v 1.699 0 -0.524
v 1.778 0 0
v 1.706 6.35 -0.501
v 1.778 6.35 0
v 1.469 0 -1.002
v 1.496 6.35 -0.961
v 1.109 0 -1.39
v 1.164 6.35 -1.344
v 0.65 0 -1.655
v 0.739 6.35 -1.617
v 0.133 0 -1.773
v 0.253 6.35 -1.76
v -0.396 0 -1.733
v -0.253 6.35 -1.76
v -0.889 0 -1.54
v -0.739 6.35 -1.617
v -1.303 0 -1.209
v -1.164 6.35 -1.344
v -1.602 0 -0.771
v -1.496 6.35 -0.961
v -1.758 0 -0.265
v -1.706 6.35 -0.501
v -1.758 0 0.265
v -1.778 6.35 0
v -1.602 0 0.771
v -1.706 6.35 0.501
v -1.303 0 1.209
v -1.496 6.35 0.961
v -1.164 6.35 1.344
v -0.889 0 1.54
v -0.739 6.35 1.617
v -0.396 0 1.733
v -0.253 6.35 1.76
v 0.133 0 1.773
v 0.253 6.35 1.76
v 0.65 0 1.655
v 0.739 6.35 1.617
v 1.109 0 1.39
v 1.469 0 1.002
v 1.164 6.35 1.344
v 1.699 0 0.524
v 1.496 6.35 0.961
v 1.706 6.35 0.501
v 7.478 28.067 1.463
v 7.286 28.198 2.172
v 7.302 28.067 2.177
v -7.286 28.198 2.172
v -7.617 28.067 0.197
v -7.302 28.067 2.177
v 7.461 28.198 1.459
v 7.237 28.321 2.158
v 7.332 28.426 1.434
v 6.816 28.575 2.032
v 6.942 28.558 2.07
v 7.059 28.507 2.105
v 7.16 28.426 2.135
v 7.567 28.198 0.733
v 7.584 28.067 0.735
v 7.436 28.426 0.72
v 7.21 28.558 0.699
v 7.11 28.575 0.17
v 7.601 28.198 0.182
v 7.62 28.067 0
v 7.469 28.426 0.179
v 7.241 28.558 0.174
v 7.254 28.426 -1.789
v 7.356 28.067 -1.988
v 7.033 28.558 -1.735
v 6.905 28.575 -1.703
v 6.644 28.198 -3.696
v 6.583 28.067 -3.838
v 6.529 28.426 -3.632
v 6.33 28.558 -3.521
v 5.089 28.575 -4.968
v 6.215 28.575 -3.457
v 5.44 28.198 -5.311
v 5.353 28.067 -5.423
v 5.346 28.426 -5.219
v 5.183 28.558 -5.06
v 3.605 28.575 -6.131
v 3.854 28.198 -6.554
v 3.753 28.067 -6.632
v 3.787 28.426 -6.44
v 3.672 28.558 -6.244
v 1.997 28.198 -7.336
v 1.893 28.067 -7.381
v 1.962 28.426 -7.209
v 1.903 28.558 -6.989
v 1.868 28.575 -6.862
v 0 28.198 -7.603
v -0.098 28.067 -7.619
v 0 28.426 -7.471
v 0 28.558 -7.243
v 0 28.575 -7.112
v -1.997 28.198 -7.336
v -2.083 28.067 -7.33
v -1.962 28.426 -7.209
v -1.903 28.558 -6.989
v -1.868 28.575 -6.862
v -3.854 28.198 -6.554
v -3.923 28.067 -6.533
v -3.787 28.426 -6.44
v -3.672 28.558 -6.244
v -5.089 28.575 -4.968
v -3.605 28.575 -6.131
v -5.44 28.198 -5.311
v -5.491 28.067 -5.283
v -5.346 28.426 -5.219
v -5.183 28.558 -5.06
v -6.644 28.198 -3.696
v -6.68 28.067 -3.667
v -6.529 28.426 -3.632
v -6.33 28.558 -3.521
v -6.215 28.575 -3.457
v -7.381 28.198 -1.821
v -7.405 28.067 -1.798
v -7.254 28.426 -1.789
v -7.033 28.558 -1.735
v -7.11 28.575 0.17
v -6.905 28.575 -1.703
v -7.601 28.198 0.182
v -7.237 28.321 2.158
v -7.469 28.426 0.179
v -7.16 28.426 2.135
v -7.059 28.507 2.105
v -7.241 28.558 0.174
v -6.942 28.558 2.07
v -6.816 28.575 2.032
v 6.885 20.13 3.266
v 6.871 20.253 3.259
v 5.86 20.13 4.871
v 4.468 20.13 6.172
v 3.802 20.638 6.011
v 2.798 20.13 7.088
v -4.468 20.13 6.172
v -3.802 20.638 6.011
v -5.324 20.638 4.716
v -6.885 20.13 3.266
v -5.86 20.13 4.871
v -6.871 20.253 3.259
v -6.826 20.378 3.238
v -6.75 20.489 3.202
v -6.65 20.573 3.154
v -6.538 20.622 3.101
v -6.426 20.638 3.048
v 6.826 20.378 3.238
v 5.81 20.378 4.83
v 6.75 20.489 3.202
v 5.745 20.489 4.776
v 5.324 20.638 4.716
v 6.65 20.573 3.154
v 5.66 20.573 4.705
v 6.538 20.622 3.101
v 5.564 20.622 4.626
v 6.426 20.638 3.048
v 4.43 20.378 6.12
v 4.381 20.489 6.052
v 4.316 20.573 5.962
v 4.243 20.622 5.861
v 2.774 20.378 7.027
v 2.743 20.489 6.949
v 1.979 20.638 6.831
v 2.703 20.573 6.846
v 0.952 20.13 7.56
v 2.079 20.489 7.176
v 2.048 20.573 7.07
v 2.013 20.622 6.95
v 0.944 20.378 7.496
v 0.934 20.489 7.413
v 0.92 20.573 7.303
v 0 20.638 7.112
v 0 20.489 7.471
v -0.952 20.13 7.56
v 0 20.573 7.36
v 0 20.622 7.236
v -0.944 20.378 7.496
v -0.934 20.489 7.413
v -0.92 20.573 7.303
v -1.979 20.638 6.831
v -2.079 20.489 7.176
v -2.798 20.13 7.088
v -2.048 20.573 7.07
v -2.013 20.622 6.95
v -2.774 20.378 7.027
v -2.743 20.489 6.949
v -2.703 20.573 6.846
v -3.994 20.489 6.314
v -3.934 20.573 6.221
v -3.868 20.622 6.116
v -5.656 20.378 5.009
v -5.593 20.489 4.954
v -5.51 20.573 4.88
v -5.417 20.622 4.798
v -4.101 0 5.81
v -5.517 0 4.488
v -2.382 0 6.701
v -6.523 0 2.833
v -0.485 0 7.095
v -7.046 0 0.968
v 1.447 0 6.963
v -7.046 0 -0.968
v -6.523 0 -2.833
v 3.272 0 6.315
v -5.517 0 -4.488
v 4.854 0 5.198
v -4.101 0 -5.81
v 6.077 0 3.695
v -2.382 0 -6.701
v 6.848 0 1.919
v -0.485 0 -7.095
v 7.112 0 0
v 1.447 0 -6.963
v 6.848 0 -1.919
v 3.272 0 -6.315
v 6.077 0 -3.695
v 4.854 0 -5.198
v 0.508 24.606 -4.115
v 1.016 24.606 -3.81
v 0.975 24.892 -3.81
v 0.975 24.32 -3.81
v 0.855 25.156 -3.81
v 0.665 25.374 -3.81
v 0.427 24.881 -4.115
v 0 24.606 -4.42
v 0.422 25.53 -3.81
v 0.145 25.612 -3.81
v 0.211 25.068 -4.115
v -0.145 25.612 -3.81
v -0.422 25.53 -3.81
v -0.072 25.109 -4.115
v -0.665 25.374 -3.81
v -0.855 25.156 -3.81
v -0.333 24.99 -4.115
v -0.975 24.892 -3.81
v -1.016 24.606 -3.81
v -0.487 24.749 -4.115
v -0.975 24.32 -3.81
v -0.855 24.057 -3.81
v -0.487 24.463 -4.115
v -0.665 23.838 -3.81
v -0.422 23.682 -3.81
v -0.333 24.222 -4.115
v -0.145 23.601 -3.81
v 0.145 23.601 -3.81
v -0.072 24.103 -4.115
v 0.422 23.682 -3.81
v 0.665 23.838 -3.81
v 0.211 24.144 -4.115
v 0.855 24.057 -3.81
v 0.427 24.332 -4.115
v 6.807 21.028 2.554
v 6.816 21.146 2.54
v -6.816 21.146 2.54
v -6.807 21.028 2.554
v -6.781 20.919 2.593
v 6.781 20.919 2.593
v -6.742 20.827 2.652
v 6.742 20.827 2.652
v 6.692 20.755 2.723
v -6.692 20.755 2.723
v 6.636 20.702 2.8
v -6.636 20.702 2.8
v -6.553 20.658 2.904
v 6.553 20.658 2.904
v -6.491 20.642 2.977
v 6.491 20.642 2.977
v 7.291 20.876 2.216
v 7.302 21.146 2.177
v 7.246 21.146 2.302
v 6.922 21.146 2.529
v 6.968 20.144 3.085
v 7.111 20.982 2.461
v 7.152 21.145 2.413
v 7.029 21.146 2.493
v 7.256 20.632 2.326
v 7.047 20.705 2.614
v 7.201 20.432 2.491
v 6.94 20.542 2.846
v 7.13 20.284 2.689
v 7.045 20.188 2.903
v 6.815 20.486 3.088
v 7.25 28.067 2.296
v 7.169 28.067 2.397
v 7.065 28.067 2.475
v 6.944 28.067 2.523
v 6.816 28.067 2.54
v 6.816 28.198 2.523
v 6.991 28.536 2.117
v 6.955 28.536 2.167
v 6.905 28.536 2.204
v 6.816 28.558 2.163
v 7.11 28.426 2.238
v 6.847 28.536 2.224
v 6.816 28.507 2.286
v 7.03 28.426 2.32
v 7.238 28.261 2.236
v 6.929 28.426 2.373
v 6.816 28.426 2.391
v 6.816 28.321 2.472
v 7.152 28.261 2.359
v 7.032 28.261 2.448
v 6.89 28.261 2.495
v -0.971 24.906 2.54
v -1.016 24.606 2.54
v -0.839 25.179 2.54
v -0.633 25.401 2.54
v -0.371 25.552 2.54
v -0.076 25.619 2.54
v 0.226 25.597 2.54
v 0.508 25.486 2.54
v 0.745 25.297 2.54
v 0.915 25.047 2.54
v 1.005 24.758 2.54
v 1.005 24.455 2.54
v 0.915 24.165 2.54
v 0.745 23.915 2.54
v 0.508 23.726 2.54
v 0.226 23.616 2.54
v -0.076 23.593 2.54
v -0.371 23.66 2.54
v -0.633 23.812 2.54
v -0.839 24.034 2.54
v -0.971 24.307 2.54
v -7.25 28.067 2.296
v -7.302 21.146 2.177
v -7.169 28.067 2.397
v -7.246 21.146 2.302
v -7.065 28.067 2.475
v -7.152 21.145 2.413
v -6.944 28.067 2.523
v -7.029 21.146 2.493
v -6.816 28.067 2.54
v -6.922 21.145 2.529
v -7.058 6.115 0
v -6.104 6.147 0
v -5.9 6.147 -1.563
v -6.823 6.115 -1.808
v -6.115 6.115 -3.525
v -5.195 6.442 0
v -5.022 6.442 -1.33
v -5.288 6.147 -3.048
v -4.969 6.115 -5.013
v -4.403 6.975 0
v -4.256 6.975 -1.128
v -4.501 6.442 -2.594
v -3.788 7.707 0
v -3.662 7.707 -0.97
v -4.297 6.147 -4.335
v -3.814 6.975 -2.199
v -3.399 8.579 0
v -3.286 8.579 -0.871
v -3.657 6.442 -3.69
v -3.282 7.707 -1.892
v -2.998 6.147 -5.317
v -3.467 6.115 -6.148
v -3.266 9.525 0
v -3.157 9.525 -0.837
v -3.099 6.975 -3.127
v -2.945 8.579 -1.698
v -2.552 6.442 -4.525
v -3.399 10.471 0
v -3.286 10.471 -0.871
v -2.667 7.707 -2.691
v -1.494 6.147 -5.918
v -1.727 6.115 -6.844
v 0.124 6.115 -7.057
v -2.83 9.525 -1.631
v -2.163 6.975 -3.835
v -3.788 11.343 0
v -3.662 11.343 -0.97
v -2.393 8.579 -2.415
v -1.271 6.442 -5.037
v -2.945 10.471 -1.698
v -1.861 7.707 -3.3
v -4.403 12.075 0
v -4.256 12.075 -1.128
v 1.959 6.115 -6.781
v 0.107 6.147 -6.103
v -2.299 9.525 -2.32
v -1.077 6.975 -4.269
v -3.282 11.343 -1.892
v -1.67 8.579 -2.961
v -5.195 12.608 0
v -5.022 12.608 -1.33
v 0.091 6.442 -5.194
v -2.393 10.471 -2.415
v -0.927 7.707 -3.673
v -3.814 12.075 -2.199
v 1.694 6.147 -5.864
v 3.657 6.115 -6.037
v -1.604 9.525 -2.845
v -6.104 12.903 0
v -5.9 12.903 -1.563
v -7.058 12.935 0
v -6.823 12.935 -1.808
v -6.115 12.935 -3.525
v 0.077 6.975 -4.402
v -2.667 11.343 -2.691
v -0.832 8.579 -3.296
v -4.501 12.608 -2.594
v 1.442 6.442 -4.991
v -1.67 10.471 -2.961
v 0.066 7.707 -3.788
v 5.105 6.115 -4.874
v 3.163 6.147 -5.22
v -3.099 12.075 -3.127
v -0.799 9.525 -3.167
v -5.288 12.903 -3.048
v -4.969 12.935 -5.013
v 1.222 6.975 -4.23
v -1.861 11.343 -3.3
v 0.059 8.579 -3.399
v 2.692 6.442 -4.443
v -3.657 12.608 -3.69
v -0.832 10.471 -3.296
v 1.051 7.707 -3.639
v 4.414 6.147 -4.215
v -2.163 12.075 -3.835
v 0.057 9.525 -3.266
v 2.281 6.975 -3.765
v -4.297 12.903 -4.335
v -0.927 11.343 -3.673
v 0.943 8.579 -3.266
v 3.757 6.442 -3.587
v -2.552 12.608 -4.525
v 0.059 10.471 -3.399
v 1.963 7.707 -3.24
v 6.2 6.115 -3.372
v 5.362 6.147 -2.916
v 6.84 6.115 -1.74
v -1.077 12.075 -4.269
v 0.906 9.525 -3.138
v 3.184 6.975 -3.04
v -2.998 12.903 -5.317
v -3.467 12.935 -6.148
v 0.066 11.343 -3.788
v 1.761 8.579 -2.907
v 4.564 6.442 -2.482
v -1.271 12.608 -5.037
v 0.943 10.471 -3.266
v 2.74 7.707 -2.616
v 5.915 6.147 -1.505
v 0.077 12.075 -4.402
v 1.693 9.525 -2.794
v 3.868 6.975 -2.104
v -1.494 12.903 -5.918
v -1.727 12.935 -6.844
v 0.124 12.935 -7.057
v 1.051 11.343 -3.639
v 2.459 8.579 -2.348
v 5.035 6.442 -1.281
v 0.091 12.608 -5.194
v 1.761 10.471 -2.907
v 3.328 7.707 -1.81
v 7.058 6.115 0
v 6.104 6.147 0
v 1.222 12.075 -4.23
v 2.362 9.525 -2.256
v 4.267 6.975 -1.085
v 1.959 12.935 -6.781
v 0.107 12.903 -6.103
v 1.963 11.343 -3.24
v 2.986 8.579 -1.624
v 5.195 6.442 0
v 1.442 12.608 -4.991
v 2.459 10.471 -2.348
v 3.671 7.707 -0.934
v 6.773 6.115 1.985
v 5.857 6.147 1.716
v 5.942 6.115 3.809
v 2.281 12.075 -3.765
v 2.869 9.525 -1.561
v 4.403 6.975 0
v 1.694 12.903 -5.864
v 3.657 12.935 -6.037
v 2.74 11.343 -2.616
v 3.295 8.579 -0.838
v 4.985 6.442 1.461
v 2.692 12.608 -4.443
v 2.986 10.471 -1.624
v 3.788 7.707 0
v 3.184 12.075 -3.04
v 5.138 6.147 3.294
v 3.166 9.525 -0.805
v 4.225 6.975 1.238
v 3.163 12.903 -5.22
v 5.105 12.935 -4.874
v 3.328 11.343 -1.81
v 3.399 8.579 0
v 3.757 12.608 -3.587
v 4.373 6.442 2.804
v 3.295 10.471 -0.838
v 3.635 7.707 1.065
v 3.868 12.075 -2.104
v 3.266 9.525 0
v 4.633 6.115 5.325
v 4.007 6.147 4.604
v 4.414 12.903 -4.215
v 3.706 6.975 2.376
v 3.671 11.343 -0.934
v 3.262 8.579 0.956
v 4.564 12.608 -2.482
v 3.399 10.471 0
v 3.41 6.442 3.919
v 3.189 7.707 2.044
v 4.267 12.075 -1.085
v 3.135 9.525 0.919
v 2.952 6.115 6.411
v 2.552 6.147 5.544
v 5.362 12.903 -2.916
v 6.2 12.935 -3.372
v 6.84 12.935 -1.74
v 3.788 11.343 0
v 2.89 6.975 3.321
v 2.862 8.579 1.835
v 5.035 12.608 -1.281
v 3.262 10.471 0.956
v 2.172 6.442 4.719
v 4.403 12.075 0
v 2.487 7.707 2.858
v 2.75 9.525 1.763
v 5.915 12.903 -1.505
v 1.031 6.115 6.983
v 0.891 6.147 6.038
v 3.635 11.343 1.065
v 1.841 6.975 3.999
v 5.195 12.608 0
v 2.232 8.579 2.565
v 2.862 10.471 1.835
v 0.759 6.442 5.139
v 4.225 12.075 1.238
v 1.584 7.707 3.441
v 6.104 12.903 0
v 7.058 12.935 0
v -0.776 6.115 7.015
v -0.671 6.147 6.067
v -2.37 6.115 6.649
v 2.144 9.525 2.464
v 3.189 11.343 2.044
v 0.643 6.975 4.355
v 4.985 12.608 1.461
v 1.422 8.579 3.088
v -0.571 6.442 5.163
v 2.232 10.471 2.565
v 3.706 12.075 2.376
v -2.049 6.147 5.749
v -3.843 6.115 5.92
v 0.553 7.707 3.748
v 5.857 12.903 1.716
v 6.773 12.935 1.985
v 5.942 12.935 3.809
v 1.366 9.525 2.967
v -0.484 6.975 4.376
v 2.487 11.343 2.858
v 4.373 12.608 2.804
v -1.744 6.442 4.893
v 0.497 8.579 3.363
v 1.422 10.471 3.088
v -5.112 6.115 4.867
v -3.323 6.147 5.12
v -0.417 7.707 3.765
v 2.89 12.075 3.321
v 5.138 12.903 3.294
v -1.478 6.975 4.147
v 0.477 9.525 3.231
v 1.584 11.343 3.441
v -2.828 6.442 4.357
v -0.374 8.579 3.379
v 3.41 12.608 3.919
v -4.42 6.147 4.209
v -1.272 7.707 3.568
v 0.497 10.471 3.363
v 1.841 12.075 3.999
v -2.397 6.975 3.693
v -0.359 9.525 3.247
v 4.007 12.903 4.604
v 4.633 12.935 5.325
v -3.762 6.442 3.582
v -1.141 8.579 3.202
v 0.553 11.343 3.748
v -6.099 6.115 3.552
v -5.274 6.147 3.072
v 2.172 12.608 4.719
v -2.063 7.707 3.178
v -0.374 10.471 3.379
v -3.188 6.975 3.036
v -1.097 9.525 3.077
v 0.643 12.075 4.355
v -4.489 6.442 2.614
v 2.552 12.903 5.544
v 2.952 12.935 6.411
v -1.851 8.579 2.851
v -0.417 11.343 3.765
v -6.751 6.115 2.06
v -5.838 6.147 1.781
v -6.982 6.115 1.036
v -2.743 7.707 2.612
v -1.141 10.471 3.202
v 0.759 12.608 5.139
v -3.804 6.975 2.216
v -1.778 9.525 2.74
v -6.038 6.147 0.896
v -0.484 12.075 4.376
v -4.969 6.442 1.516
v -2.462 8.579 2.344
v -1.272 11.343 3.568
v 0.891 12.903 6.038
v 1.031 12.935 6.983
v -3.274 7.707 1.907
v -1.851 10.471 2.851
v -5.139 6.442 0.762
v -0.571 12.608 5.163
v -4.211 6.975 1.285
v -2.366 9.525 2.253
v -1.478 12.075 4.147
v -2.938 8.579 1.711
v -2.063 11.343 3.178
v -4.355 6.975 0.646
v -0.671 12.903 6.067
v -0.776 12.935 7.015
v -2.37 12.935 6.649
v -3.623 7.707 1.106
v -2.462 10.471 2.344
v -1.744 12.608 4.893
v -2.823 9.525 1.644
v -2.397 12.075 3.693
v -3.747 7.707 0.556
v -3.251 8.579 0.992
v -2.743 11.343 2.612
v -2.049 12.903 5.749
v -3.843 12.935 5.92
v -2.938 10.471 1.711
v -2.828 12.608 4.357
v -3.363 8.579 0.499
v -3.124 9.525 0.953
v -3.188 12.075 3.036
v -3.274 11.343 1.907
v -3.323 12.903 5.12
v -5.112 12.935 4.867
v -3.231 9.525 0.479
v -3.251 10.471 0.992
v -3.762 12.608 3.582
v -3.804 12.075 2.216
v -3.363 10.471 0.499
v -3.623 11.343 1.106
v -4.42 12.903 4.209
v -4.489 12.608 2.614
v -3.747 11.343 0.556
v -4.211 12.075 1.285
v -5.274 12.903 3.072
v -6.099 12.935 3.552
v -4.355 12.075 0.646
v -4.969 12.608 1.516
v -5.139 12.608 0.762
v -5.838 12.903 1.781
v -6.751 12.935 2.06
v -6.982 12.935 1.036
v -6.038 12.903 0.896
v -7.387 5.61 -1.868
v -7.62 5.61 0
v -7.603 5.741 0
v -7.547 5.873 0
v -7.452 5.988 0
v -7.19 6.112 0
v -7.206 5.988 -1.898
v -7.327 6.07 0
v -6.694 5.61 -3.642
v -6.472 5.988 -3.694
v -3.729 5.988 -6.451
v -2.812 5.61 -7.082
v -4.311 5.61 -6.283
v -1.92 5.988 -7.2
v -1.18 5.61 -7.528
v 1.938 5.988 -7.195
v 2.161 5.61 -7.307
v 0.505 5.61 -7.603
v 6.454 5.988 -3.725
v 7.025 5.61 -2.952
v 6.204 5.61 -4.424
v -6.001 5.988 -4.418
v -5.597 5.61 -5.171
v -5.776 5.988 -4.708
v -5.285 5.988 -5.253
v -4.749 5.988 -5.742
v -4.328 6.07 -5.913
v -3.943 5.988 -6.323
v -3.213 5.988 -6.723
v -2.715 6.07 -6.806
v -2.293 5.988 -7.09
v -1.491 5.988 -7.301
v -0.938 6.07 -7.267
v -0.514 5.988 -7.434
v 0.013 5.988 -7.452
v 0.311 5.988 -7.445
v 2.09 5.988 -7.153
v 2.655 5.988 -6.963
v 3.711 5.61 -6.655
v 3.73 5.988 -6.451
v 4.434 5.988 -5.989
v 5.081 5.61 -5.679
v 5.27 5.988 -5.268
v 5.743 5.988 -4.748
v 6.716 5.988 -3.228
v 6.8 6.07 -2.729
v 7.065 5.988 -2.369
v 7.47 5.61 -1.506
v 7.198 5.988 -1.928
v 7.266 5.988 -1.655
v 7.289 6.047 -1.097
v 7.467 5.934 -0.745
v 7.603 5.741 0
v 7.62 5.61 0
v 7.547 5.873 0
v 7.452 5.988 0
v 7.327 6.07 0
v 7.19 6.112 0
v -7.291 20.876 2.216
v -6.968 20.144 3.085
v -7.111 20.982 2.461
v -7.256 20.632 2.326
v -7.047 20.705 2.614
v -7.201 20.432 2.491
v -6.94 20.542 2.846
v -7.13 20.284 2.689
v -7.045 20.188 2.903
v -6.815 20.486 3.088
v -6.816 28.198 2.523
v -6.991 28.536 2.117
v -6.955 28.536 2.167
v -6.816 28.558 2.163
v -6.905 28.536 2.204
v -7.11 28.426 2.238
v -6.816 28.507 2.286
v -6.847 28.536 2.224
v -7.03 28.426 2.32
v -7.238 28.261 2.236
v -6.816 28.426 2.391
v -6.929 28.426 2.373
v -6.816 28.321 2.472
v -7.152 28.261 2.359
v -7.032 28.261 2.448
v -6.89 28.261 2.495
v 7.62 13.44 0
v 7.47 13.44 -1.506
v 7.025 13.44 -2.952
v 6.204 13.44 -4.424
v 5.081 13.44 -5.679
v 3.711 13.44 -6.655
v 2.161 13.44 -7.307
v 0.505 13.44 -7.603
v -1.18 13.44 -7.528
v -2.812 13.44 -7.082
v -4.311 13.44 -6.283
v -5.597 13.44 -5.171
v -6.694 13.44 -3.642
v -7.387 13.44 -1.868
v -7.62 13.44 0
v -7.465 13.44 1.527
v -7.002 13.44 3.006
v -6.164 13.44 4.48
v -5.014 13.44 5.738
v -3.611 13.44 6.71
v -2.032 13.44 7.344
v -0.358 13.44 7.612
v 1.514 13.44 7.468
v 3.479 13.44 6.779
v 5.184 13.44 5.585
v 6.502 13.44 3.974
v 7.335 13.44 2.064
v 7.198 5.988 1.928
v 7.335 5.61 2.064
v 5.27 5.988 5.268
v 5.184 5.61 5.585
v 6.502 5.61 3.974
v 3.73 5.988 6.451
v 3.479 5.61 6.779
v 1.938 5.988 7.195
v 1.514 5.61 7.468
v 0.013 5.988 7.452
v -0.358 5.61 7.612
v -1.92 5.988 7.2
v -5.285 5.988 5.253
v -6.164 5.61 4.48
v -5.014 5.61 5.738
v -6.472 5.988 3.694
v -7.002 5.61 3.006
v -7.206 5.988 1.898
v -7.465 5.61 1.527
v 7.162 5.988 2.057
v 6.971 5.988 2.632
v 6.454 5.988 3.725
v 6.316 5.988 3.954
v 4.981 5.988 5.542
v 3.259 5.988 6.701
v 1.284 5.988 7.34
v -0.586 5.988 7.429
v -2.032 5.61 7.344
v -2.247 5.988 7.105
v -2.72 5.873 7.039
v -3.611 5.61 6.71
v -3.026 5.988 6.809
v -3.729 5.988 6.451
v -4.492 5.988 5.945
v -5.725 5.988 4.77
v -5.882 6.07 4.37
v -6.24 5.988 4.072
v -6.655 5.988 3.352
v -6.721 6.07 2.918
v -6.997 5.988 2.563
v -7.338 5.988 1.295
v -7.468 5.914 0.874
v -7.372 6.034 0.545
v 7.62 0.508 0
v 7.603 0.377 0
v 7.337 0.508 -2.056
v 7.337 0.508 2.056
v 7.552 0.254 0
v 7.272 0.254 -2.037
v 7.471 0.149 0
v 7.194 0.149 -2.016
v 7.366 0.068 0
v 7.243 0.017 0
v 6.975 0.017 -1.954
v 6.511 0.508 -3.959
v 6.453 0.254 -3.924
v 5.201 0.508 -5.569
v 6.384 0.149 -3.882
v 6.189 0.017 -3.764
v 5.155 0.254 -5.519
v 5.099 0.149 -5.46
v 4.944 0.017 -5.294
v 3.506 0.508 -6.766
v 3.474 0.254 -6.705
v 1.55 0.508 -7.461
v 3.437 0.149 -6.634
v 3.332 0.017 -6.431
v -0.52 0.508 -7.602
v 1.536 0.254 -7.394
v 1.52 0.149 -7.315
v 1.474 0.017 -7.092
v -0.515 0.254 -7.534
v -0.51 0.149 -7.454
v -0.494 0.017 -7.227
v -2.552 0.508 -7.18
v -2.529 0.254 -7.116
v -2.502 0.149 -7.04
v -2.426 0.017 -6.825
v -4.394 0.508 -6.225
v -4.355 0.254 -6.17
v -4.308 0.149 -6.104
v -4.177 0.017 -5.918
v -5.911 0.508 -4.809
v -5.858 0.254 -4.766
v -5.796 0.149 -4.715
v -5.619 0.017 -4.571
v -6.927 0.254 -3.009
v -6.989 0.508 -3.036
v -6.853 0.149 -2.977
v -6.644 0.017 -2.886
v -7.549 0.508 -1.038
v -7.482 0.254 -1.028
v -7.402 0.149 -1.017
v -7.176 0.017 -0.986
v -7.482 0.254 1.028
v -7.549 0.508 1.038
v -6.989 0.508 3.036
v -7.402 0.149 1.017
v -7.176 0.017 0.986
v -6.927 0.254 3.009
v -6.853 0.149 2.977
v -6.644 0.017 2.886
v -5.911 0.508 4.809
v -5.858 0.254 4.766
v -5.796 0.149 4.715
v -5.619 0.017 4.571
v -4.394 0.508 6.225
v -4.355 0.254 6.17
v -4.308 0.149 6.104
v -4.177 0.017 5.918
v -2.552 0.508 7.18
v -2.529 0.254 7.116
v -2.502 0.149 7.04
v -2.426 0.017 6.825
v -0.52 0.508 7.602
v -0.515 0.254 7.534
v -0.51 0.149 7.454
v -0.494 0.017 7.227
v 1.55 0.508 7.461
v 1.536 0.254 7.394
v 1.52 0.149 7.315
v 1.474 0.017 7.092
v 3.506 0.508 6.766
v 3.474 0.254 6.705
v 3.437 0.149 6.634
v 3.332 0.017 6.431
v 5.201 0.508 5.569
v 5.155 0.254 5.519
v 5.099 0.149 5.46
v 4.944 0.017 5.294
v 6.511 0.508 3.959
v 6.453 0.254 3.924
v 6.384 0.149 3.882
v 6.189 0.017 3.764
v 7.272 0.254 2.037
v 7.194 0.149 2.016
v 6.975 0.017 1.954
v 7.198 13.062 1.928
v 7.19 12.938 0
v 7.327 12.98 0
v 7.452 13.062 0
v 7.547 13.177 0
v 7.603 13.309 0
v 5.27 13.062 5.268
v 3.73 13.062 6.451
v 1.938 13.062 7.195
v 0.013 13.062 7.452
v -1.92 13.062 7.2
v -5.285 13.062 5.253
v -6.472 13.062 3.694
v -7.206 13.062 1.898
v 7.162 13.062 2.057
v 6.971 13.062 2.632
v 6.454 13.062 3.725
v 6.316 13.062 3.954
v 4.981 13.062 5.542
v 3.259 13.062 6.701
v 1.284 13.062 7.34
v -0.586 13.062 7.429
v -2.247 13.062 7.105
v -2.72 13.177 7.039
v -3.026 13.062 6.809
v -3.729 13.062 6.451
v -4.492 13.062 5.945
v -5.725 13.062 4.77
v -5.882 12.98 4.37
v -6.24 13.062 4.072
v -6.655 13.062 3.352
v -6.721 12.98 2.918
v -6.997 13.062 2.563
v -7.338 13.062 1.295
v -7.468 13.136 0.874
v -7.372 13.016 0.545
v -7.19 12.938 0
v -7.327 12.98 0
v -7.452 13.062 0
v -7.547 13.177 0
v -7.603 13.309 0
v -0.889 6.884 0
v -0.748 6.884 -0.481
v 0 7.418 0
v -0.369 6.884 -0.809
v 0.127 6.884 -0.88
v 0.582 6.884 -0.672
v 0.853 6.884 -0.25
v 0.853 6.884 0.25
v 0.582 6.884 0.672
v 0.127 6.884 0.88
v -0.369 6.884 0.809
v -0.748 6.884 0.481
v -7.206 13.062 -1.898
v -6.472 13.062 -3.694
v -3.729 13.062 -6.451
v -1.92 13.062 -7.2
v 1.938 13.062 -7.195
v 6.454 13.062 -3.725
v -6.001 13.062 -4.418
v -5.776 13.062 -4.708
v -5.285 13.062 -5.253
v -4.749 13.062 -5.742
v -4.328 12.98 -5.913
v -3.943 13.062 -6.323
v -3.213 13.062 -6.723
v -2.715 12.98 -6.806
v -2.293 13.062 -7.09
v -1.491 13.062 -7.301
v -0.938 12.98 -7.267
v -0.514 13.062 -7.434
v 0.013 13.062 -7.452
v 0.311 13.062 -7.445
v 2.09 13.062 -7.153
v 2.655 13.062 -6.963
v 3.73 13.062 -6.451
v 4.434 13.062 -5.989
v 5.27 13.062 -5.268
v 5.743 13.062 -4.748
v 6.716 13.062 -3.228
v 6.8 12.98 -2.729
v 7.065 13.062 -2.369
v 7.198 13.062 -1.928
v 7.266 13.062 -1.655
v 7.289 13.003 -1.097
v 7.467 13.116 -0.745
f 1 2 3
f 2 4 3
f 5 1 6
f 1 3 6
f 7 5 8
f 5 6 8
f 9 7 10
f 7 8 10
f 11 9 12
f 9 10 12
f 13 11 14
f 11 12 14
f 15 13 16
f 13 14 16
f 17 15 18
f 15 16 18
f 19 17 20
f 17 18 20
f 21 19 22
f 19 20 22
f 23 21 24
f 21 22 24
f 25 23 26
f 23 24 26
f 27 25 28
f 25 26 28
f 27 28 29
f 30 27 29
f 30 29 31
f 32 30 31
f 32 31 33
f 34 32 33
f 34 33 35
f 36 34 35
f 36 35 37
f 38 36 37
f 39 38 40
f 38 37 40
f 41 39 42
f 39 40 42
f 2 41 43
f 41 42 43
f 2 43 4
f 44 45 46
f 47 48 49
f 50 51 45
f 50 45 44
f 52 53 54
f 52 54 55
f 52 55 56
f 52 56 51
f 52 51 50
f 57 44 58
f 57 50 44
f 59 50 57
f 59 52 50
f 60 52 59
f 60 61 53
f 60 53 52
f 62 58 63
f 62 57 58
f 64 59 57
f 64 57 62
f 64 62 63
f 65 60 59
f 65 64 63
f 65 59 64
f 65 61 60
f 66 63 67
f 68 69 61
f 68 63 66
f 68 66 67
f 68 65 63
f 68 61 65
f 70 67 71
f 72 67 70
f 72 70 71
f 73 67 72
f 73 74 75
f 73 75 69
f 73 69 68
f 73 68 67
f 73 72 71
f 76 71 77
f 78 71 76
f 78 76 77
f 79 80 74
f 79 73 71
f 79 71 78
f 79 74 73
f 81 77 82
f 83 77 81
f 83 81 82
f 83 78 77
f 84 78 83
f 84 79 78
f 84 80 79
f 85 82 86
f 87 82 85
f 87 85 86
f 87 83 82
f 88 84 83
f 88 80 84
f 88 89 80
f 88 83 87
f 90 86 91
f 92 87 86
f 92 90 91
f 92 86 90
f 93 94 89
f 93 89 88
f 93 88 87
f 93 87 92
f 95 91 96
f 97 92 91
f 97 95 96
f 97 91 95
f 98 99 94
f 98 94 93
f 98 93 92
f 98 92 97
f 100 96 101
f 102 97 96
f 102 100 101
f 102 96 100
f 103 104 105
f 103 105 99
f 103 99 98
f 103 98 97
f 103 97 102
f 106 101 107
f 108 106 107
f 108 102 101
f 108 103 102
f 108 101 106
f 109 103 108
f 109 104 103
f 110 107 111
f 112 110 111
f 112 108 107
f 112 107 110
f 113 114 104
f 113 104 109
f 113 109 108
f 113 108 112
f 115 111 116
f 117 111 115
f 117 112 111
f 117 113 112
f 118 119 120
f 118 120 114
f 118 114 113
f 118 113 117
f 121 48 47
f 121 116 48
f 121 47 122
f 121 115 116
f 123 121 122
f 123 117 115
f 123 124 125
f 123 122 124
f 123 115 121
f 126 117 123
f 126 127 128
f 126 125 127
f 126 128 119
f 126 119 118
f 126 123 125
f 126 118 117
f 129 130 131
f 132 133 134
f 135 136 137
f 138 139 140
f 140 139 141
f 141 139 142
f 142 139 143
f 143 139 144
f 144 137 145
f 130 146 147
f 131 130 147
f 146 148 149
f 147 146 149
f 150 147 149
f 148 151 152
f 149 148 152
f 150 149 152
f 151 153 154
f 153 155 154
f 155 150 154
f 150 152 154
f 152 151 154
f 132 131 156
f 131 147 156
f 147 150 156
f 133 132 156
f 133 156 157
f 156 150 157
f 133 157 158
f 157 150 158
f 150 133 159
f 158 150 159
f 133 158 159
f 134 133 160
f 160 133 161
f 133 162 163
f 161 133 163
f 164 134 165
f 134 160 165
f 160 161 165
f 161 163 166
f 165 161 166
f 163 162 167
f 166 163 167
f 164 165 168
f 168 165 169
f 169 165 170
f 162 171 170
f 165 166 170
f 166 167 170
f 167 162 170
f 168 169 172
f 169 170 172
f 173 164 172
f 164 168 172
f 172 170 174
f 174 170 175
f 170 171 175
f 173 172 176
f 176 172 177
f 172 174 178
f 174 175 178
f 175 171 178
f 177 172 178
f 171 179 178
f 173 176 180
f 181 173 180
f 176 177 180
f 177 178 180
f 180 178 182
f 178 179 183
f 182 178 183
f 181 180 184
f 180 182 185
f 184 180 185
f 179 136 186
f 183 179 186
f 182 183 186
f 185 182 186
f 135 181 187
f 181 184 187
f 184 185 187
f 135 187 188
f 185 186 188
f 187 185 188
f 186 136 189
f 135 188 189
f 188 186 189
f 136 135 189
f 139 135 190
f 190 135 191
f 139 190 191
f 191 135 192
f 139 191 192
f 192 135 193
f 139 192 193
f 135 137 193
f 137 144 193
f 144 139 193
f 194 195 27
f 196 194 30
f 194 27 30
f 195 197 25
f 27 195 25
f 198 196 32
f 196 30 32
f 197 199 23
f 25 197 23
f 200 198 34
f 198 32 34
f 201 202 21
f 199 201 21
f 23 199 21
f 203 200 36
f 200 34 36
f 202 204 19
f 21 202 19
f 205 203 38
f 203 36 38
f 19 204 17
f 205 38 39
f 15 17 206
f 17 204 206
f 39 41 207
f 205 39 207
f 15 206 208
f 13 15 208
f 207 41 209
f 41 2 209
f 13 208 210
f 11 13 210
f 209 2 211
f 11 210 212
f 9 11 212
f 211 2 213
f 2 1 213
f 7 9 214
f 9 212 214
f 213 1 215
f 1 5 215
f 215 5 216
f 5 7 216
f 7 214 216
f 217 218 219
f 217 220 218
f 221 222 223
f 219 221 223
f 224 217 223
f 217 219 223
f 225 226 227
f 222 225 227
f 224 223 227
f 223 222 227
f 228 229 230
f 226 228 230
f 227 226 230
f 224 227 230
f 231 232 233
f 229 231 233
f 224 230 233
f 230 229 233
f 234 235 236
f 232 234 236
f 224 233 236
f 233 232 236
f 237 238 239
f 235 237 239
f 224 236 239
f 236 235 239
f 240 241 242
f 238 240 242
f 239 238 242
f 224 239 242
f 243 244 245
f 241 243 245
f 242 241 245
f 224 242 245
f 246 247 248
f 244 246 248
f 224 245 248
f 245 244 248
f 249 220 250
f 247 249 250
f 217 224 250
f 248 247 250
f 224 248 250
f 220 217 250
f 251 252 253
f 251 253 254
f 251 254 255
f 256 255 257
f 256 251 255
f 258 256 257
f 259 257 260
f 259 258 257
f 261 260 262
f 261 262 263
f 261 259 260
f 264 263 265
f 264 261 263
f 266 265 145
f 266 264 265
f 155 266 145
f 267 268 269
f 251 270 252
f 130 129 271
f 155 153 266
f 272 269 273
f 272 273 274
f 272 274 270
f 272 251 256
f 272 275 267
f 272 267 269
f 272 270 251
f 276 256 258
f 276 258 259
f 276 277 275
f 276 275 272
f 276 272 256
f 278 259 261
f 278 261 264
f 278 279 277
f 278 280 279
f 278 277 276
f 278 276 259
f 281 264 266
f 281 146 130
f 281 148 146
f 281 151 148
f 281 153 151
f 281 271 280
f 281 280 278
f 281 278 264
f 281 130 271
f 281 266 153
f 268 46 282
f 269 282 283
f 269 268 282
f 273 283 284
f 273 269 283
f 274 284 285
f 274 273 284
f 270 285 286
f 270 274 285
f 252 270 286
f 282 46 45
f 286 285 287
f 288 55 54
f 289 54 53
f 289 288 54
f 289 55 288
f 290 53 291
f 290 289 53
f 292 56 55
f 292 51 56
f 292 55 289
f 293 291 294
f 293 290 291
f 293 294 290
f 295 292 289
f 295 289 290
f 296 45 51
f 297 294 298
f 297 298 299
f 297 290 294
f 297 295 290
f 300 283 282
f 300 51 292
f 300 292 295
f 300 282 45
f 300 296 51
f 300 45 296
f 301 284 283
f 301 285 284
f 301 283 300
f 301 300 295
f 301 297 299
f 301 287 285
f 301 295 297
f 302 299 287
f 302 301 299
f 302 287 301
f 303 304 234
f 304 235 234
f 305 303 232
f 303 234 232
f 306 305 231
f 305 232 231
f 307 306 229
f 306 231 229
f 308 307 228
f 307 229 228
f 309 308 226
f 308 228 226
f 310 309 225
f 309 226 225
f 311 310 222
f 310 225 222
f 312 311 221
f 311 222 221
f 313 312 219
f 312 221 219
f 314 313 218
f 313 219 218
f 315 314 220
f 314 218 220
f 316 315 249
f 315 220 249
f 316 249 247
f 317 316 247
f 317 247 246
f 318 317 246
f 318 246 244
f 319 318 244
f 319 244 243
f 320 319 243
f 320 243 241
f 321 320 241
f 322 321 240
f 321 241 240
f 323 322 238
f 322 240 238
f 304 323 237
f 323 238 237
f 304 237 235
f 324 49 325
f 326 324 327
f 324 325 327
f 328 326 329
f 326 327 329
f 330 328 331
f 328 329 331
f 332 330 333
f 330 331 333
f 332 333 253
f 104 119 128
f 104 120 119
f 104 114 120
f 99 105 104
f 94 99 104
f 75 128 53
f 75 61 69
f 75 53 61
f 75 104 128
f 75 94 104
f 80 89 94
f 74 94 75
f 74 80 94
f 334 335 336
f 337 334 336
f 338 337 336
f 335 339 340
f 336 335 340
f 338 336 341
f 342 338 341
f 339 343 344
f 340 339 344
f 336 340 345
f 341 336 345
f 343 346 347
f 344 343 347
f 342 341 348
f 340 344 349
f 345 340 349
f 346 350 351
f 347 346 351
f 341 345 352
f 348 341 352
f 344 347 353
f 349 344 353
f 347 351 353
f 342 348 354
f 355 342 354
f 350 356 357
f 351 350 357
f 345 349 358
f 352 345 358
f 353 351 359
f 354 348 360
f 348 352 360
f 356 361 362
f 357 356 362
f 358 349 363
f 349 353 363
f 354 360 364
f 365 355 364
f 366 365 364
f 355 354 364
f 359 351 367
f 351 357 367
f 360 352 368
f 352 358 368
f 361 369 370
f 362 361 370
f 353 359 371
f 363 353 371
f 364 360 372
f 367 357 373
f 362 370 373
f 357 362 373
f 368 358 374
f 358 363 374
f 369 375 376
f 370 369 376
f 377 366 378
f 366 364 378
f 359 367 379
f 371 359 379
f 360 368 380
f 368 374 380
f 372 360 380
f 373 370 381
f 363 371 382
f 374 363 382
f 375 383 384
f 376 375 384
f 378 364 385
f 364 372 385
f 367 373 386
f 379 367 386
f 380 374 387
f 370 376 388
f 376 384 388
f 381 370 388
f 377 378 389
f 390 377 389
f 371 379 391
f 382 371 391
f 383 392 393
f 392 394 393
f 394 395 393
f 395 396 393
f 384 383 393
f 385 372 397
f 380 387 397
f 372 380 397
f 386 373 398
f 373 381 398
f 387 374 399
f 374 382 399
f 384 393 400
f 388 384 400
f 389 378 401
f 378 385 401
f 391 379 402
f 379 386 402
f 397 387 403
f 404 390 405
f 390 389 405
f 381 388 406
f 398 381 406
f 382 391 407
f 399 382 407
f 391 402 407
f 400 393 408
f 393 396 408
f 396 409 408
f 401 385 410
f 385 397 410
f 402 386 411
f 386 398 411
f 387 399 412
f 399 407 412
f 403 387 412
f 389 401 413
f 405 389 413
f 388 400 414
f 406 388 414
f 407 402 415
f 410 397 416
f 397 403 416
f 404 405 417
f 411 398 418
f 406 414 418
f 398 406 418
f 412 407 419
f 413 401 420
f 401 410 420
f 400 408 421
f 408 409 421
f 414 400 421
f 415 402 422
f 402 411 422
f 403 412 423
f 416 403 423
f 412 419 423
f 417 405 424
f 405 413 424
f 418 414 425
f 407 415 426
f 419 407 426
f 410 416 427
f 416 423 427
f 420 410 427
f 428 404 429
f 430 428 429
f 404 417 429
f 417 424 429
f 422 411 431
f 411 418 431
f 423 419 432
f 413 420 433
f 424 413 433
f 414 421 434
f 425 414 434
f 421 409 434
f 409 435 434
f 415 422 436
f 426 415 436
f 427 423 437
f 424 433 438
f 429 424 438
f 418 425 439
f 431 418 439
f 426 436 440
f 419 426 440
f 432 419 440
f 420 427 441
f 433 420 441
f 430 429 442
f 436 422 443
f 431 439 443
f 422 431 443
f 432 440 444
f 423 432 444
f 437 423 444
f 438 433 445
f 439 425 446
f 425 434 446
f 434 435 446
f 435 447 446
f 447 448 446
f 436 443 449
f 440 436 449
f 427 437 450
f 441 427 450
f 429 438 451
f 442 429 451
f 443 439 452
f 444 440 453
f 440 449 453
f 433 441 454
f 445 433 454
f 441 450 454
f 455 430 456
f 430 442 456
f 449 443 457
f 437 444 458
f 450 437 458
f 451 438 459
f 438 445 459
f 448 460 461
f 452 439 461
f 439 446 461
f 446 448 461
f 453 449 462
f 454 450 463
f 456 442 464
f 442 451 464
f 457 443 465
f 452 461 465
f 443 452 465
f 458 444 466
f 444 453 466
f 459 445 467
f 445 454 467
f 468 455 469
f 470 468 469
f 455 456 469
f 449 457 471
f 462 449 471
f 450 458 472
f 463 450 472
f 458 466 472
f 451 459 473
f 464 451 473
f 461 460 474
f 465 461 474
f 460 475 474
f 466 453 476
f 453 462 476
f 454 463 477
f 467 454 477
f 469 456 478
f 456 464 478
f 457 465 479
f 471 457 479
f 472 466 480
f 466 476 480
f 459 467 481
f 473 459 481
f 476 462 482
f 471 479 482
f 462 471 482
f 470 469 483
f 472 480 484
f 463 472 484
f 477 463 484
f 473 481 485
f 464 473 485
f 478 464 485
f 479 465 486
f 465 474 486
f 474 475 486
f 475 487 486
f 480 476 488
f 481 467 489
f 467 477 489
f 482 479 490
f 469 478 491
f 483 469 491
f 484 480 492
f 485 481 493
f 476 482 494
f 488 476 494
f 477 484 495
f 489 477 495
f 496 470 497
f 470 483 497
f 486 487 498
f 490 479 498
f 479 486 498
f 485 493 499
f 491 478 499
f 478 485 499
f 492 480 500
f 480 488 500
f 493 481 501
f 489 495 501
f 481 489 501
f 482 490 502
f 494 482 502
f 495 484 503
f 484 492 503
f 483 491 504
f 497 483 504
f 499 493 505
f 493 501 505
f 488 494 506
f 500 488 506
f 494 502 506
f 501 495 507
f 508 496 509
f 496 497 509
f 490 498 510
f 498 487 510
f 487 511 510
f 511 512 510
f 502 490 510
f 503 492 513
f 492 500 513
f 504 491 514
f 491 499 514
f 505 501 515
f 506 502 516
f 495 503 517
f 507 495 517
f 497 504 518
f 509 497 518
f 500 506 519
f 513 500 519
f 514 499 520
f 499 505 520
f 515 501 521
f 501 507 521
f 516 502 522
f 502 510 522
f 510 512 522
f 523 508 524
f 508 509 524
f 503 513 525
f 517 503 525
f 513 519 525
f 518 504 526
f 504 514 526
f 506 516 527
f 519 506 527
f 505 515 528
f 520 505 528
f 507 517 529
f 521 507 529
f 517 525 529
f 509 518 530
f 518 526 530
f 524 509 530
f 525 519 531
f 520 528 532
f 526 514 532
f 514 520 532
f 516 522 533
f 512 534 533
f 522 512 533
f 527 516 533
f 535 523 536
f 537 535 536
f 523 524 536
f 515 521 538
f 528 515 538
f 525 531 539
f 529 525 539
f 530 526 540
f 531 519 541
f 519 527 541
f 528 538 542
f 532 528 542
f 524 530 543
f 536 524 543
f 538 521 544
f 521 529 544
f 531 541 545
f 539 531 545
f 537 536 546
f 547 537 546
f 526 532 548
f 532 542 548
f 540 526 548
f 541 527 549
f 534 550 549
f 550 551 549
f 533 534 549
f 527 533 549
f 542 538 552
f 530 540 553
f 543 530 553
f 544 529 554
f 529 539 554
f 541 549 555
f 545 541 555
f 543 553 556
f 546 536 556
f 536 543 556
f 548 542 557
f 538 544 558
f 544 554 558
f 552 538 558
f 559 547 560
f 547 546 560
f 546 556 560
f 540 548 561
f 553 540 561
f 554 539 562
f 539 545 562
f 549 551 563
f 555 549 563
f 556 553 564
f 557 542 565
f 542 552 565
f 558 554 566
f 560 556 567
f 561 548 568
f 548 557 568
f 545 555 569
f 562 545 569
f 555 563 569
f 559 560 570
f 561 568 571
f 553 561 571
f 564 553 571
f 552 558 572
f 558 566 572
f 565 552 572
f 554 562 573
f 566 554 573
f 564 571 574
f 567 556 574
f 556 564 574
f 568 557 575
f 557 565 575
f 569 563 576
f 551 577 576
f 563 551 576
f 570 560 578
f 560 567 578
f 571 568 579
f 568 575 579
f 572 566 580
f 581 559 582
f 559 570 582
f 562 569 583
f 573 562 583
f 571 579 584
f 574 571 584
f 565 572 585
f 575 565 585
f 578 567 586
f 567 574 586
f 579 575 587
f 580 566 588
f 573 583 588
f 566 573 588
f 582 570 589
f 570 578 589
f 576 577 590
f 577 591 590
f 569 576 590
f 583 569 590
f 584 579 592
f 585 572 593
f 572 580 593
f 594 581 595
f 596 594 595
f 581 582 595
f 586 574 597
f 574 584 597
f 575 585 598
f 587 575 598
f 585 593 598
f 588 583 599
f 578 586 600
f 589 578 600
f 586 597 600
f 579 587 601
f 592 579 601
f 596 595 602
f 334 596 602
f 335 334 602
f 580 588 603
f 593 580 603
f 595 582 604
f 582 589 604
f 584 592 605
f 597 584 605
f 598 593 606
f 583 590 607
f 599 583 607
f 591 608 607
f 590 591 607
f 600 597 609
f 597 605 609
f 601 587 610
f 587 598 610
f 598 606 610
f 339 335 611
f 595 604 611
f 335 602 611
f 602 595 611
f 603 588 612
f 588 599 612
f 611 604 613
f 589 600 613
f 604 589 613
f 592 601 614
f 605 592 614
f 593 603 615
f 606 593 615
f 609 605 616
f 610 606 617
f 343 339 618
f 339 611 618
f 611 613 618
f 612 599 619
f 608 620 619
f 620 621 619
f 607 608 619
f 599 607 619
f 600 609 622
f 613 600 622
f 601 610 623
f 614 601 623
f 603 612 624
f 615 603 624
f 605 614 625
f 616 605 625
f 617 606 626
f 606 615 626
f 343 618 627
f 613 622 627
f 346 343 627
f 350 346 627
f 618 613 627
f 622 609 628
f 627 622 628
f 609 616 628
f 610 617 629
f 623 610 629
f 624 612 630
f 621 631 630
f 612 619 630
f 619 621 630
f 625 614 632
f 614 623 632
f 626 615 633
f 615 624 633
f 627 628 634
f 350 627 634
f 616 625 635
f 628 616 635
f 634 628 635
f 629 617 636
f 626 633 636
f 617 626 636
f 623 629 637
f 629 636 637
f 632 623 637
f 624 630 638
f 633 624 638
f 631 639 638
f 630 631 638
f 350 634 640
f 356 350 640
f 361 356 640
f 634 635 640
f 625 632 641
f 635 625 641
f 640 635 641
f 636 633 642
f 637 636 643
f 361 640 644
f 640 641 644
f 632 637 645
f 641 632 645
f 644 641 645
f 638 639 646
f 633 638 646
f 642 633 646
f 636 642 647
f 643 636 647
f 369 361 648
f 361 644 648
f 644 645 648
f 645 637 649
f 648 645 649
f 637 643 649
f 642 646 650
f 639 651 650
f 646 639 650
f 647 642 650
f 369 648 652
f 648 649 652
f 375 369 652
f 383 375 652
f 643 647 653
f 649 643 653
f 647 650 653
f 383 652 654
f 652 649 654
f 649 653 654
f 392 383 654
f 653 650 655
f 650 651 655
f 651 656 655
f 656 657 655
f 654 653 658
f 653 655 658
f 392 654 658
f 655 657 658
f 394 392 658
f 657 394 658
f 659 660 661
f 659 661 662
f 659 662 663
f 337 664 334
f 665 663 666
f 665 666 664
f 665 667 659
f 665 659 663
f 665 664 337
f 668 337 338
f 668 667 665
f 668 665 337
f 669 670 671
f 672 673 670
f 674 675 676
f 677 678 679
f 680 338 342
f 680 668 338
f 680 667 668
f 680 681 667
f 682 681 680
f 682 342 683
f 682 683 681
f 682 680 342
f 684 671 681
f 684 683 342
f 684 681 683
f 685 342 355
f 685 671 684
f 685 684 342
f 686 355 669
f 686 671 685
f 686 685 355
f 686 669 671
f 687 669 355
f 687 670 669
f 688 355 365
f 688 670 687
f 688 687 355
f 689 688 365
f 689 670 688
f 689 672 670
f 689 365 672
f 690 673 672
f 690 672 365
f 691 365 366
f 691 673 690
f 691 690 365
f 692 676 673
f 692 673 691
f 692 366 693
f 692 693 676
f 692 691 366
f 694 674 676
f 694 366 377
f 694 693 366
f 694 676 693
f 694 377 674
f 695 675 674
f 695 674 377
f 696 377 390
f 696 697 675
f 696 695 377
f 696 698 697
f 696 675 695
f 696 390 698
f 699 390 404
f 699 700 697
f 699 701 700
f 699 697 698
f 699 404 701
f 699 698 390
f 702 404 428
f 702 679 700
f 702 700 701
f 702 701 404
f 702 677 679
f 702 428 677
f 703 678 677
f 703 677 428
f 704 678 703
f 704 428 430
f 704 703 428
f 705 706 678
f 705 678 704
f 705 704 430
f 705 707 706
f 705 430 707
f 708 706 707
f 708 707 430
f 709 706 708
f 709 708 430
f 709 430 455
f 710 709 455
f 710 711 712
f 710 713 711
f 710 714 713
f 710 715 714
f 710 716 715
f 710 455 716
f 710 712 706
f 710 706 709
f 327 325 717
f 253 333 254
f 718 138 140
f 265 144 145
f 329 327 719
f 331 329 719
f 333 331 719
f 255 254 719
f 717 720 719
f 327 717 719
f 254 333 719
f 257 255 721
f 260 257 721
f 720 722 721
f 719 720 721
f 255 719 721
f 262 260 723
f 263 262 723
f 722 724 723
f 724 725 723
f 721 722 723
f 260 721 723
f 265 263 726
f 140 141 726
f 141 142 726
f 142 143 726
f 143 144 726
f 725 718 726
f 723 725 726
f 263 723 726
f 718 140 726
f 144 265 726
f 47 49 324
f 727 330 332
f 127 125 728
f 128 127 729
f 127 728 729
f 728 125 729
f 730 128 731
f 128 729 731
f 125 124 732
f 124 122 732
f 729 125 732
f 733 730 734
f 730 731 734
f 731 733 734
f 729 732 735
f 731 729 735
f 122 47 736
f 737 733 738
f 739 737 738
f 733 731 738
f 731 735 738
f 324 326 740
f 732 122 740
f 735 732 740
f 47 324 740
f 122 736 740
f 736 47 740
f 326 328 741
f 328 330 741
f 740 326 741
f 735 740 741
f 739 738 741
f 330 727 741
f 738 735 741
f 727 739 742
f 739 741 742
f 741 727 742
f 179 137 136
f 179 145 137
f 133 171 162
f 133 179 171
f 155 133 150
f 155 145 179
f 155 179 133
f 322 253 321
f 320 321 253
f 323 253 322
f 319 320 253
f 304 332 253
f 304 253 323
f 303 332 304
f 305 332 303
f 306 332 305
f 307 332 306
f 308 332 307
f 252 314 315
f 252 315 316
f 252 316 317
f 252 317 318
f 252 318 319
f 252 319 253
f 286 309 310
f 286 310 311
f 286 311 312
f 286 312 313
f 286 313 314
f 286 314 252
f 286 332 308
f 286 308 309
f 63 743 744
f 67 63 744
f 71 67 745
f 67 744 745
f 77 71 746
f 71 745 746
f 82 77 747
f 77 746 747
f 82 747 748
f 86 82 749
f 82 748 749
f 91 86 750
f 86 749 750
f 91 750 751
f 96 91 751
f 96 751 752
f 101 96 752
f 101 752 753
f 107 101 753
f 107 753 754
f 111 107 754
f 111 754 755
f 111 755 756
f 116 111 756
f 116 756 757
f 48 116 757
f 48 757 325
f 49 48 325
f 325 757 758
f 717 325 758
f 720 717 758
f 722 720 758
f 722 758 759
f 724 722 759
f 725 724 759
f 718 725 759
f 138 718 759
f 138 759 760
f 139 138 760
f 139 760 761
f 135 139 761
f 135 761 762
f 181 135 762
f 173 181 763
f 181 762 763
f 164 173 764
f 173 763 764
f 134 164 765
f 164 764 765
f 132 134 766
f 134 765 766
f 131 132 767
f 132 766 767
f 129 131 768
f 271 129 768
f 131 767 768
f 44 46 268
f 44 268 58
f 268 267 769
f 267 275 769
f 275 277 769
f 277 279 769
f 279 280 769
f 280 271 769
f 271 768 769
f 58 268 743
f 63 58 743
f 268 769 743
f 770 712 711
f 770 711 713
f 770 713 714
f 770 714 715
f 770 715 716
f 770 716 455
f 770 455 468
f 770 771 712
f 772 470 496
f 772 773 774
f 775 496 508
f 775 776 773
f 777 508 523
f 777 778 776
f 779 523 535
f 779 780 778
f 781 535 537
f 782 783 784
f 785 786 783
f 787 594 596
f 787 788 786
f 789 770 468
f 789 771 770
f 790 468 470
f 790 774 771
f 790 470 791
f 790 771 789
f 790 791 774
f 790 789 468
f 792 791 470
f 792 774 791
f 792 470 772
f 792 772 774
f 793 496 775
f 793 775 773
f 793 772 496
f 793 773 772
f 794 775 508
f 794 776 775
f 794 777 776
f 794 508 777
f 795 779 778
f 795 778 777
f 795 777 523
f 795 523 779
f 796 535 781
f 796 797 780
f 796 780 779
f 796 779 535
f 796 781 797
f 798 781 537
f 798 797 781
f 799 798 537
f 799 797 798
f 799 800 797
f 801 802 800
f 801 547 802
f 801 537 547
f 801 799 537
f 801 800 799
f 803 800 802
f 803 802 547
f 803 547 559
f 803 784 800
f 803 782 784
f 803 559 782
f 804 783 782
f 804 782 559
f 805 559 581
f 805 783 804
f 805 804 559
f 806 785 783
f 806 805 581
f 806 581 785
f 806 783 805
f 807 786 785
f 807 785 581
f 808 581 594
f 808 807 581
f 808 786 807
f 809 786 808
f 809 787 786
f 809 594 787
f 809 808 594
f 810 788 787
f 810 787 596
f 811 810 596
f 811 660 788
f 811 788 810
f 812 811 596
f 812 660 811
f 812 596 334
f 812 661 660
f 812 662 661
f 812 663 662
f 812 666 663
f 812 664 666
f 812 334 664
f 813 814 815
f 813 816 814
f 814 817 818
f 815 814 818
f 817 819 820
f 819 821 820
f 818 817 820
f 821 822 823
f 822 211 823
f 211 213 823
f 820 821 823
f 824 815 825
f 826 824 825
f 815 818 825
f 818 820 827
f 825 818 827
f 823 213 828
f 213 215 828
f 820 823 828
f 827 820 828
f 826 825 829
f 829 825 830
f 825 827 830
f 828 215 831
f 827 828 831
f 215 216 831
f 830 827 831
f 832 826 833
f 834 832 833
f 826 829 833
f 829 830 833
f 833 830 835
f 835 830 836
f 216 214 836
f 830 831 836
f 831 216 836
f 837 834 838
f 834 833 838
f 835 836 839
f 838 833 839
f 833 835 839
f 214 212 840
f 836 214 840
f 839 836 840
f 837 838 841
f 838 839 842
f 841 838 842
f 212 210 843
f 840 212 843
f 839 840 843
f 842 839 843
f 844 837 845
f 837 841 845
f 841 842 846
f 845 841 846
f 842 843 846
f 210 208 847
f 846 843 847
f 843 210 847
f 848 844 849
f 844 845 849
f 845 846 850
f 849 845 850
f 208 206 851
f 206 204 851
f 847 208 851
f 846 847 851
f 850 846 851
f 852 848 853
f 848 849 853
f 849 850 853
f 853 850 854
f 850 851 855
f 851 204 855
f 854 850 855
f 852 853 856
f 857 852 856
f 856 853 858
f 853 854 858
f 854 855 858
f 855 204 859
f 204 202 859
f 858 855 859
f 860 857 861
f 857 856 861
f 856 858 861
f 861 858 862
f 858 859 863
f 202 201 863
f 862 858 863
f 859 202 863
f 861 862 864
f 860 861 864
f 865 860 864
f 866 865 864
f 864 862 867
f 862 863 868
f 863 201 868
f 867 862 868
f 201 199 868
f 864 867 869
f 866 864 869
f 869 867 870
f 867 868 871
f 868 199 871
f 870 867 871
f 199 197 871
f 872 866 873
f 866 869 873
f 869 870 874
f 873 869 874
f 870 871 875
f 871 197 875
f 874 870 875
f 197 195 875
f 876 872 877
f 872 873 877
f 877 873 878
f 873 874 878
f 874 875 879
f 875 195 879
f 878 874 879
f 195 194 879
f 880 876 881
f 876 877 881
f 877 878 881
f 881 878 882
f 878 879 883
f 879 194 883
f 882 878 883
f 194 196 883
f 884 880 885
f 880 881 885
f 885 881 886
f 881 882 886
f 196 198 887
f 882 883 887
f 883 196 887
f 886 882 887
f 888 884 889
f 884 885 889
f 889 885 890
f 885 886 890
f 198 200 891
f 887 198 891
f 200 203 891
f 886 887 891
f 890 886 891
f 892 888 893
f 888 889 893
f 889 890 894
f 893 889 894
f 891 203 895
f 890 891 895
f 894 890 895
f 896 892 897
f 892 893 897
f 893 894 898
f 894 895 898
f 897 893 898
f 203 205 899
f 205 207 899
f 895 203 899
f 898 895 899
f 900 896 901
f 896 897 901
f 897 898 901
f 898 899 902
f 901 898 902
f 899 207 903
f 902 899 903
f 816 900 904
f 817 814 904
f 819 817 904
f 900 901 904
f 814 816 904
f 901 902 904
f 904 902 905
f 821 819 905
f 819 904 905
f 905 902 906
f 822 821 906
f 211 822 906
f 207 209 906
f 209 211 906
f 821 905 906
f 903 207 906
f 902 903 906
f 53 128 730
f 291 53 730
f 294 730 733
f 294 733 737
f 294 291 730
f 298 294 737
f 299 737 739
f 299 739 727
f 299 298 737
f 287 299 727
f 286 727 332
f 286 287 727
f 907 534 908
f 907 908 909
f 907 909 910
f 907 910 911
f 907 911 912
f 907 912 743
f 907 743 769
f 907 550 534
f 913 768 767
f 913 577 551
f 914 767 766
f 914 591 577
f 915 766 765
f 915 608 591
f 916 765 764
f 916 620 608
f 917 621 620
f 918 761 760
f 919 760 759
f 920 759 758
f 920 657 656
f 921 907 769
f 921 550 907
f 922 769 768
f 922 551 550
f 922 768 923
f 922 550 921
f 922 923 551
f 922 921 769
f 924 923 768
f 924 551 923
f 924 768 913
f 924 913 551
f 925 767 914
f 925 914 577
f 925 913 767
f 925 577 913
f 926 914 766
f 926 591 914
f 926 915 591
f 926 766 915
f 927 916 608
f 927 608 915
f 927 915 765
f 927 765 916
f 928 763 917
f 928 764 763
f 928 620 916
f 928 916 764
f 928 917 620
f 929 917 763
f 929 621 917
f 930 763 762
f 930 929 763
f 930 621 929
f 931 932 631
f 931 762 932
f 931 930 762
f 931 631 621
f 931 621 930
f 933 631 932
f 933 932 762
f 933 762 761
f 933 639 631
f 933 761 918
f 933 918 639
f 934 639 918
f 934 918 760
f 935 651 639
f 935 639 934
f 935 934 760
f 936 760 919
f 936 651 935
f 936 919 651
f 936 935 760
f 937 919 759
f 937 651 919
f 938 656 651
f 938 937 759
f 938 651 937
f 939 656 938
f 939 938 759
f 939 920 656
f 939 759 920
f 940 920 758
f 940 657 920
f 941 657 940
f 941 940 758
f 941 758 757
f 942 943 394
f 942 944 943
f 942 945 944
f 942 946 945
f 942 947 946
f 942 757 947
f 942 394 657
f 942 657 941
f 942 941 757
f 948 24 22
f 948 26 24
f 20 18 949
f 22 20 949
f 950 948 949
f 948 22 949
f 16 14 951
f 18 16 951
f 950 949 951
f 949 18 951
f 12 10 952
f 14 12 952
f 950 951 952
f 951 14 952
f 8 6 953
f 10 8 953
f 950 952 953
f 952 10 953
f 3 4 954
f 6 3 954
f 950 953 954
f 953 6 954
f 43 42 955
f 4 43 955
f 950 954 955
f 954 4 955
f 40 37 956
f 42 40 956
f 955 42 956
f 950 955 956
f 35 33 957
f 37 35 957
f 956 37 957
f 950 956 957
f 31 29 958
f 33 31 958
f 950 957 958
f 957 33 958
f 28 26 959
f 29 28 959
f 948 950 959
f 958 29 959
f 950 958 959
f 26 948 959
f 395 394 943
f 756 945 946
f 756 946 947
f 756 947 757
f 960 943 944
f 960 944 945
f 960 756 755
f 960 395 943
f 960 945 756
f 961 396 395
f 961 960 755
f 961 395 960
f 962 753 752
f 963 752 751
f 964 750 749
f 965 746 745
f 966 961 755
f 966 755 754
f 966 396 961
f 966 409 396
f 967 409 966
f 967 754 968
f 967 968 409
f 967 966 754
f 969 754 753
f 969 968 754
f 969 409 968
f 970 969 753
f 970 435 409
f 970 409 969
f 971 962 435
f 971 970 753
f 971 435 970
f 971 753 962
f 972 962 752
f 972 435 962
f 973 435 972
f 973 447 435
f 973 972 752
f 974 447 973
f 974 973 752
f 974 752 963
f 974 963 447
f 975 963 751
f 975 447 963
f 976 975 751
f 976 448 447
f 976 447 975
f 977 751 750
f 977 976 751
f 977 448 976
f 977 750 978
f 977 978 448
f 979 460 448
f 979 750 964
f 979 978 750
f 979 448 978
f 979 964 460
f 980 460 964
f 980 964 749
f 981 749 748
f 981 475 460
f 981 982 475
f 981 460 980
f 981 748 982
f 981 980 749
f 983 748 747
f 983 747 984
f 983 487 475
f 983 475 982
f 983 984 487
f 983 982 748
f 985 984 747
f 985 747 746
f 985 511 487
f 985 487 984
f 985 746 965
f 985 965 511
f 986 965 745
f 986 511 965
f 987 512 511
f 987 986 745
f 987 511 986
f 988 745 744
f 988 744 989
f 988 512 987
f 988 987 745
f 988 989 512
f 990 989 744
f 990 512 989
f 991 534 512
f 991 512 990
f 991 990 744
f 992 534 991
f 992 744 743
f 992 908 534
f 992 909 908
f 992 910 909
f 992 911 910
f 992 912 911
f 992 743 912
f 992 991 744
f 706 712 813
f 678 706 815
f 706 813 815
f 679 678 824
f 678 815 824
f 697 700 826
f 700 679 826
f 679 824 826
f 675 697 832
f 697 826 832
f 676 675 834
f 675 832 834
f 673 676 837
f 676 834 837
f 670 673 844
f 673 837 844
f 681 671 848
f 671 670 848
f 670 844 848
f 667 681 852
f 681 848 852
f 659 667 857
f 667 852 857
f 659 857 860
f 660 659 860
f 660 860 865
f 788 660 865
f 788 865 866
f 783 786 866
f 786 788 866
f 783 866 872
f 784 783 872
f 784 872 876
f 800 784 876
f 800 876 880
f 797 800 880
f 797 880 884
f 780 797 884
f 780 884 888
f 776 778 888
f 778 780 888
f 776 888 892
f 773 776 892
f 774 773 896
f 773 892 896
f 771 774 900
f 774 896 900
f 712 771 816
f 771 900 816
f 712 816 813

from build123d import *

# Parameters (mm, degrees)
SKETCH1_R                        = 7.62
BOSS_EXTRUDE1_DEPTH              = 28.575
SKETCH3_W                        = 15.24
SKETCH3_H                        = 7.9375
CUT_EXTRUDE1_DEPTH               = 6.08
F_4_0_209_DIAMETER_HOLE1_D       = 2.032
F_4_0_209_DIAMETER_HOLE1_DEPTH   = 6.35
F_4_0_209_DIAMETER_HOLE1_TIP     = 0.610474389
F_10_0_1935_DIAMETER_HOLE1_D     = 3.556
F_10_0_1935_DIAMETER_HOLE1_DEPTH = 6.35
F_10_0_1935_DIAMETER_HOLE1_TIP   = 1.068330181
FILLET1_R                        = 0.508


with BuildPart() as part:
    # Sketch1 → Boss-Extrude1 (new body)
    with BuildSketch(Plane(origin=(0, 0, 0), x_dir=(1, 0, 0), z_dir=(0, 1, 0))):
        Circle(SKETCH1_R)
    extrude(amount=BOSS_EXTRUDE1_DEPTH)

    # Sketch2 → Cut-Revolve1 (revolve, cut)
    with BuildSketch(Plane.XY):
        with BuildLine():
            ThreePointArc((-7.62, 6.223), (-3.266426044, 9.525), (-7.62, 12.827))
            Line((-7.62, 12.827), (-7.62, 6.223))
        make_face()
    revolve(axis=Axis((0, 28.575, 0), (0, -1, 0)), mode=Mode.SUBTRACT)

    # Sketch3 → Cut-Extrude1 (cut, through all)
    with BuildSketch(Plane.XY.offset(2.54)):
        with Locations((0, 24.60625)):
            Rectangle(SKETCH3_W, SKETCH3_H)
    extrude(amount=CUT_EXTRUDE1_DEPTH, mode=Mode.SUBTRACT)

    # #4 (0.209) Diameter Hole1
    with Locations(Plane.XY.offset(2.54)):
        with Locations((0, 24.60625)):
            Hole(F_4_0_209_DIAMETER_HOLE1_D / 2, depth=F_4_0_209_DIAMETER_HOLE1_DEPTH)
            with Locations((0, 0, -(F_4_0_209_DIAMETER_HOLE1_DEPTH + F_4_0_209_DIAMETER_HOLE1_TIP / 2))):  # 118° drill point
                Cone(0, F_4_0_209_DIAMETER_HOLE1_D / 2, F_4_0_209_DIAMETER_HOLE1_TIP, mode=Mode.SUBTRACT)

    # #10 (0.1935) Diameter Hole1
    with Locations(Plane(origin=(0, 0, 0), x_dir=(-1, 0, 0), z_dir=(0, -1, 0))):
        with Locations((0, 0)):
            Hole(F_10_0_1935_DIAMETER_HOLE1_D / 2, depth=F_10_0_1935_DIAMETER_HOLE1_DEPTH)
            with Locations((0, 0, -(F_10_0_1935_DIAMETER_HOLE1_DEPTH + F_10_0_1935_DIAMETER_HOLE1_TIP / 2))):  # 118° drill point
                Cone(0, F_10_0_1935_DIAMETER_HOLE1_D / 2, F_10_0_1935_DIAMETER_HOLE1_TIP, mode=Mode.SUBTRACT)

    # Fillet1
    fillet1_edges = [part.edges().sort_by_distance(p)[0] for p in [
        (-1.288557078, 28.575, -7.510261025),
        (0, 28.575, 2.54),
        (0, 20.6375, 7.62),
        (0, 20.6375, 2.54),
        (7.184204897, 24.60625, 2.54),
        (-7.184204897, 24.60625, 2.54),
        (-7.62, 0, 0),
        (0, 6.223, 7.62),
        (0, 12.827, 7.62),
    ]]
    fillet(fillet1_edges, radius=FILLET1_R)


solid = part.part
